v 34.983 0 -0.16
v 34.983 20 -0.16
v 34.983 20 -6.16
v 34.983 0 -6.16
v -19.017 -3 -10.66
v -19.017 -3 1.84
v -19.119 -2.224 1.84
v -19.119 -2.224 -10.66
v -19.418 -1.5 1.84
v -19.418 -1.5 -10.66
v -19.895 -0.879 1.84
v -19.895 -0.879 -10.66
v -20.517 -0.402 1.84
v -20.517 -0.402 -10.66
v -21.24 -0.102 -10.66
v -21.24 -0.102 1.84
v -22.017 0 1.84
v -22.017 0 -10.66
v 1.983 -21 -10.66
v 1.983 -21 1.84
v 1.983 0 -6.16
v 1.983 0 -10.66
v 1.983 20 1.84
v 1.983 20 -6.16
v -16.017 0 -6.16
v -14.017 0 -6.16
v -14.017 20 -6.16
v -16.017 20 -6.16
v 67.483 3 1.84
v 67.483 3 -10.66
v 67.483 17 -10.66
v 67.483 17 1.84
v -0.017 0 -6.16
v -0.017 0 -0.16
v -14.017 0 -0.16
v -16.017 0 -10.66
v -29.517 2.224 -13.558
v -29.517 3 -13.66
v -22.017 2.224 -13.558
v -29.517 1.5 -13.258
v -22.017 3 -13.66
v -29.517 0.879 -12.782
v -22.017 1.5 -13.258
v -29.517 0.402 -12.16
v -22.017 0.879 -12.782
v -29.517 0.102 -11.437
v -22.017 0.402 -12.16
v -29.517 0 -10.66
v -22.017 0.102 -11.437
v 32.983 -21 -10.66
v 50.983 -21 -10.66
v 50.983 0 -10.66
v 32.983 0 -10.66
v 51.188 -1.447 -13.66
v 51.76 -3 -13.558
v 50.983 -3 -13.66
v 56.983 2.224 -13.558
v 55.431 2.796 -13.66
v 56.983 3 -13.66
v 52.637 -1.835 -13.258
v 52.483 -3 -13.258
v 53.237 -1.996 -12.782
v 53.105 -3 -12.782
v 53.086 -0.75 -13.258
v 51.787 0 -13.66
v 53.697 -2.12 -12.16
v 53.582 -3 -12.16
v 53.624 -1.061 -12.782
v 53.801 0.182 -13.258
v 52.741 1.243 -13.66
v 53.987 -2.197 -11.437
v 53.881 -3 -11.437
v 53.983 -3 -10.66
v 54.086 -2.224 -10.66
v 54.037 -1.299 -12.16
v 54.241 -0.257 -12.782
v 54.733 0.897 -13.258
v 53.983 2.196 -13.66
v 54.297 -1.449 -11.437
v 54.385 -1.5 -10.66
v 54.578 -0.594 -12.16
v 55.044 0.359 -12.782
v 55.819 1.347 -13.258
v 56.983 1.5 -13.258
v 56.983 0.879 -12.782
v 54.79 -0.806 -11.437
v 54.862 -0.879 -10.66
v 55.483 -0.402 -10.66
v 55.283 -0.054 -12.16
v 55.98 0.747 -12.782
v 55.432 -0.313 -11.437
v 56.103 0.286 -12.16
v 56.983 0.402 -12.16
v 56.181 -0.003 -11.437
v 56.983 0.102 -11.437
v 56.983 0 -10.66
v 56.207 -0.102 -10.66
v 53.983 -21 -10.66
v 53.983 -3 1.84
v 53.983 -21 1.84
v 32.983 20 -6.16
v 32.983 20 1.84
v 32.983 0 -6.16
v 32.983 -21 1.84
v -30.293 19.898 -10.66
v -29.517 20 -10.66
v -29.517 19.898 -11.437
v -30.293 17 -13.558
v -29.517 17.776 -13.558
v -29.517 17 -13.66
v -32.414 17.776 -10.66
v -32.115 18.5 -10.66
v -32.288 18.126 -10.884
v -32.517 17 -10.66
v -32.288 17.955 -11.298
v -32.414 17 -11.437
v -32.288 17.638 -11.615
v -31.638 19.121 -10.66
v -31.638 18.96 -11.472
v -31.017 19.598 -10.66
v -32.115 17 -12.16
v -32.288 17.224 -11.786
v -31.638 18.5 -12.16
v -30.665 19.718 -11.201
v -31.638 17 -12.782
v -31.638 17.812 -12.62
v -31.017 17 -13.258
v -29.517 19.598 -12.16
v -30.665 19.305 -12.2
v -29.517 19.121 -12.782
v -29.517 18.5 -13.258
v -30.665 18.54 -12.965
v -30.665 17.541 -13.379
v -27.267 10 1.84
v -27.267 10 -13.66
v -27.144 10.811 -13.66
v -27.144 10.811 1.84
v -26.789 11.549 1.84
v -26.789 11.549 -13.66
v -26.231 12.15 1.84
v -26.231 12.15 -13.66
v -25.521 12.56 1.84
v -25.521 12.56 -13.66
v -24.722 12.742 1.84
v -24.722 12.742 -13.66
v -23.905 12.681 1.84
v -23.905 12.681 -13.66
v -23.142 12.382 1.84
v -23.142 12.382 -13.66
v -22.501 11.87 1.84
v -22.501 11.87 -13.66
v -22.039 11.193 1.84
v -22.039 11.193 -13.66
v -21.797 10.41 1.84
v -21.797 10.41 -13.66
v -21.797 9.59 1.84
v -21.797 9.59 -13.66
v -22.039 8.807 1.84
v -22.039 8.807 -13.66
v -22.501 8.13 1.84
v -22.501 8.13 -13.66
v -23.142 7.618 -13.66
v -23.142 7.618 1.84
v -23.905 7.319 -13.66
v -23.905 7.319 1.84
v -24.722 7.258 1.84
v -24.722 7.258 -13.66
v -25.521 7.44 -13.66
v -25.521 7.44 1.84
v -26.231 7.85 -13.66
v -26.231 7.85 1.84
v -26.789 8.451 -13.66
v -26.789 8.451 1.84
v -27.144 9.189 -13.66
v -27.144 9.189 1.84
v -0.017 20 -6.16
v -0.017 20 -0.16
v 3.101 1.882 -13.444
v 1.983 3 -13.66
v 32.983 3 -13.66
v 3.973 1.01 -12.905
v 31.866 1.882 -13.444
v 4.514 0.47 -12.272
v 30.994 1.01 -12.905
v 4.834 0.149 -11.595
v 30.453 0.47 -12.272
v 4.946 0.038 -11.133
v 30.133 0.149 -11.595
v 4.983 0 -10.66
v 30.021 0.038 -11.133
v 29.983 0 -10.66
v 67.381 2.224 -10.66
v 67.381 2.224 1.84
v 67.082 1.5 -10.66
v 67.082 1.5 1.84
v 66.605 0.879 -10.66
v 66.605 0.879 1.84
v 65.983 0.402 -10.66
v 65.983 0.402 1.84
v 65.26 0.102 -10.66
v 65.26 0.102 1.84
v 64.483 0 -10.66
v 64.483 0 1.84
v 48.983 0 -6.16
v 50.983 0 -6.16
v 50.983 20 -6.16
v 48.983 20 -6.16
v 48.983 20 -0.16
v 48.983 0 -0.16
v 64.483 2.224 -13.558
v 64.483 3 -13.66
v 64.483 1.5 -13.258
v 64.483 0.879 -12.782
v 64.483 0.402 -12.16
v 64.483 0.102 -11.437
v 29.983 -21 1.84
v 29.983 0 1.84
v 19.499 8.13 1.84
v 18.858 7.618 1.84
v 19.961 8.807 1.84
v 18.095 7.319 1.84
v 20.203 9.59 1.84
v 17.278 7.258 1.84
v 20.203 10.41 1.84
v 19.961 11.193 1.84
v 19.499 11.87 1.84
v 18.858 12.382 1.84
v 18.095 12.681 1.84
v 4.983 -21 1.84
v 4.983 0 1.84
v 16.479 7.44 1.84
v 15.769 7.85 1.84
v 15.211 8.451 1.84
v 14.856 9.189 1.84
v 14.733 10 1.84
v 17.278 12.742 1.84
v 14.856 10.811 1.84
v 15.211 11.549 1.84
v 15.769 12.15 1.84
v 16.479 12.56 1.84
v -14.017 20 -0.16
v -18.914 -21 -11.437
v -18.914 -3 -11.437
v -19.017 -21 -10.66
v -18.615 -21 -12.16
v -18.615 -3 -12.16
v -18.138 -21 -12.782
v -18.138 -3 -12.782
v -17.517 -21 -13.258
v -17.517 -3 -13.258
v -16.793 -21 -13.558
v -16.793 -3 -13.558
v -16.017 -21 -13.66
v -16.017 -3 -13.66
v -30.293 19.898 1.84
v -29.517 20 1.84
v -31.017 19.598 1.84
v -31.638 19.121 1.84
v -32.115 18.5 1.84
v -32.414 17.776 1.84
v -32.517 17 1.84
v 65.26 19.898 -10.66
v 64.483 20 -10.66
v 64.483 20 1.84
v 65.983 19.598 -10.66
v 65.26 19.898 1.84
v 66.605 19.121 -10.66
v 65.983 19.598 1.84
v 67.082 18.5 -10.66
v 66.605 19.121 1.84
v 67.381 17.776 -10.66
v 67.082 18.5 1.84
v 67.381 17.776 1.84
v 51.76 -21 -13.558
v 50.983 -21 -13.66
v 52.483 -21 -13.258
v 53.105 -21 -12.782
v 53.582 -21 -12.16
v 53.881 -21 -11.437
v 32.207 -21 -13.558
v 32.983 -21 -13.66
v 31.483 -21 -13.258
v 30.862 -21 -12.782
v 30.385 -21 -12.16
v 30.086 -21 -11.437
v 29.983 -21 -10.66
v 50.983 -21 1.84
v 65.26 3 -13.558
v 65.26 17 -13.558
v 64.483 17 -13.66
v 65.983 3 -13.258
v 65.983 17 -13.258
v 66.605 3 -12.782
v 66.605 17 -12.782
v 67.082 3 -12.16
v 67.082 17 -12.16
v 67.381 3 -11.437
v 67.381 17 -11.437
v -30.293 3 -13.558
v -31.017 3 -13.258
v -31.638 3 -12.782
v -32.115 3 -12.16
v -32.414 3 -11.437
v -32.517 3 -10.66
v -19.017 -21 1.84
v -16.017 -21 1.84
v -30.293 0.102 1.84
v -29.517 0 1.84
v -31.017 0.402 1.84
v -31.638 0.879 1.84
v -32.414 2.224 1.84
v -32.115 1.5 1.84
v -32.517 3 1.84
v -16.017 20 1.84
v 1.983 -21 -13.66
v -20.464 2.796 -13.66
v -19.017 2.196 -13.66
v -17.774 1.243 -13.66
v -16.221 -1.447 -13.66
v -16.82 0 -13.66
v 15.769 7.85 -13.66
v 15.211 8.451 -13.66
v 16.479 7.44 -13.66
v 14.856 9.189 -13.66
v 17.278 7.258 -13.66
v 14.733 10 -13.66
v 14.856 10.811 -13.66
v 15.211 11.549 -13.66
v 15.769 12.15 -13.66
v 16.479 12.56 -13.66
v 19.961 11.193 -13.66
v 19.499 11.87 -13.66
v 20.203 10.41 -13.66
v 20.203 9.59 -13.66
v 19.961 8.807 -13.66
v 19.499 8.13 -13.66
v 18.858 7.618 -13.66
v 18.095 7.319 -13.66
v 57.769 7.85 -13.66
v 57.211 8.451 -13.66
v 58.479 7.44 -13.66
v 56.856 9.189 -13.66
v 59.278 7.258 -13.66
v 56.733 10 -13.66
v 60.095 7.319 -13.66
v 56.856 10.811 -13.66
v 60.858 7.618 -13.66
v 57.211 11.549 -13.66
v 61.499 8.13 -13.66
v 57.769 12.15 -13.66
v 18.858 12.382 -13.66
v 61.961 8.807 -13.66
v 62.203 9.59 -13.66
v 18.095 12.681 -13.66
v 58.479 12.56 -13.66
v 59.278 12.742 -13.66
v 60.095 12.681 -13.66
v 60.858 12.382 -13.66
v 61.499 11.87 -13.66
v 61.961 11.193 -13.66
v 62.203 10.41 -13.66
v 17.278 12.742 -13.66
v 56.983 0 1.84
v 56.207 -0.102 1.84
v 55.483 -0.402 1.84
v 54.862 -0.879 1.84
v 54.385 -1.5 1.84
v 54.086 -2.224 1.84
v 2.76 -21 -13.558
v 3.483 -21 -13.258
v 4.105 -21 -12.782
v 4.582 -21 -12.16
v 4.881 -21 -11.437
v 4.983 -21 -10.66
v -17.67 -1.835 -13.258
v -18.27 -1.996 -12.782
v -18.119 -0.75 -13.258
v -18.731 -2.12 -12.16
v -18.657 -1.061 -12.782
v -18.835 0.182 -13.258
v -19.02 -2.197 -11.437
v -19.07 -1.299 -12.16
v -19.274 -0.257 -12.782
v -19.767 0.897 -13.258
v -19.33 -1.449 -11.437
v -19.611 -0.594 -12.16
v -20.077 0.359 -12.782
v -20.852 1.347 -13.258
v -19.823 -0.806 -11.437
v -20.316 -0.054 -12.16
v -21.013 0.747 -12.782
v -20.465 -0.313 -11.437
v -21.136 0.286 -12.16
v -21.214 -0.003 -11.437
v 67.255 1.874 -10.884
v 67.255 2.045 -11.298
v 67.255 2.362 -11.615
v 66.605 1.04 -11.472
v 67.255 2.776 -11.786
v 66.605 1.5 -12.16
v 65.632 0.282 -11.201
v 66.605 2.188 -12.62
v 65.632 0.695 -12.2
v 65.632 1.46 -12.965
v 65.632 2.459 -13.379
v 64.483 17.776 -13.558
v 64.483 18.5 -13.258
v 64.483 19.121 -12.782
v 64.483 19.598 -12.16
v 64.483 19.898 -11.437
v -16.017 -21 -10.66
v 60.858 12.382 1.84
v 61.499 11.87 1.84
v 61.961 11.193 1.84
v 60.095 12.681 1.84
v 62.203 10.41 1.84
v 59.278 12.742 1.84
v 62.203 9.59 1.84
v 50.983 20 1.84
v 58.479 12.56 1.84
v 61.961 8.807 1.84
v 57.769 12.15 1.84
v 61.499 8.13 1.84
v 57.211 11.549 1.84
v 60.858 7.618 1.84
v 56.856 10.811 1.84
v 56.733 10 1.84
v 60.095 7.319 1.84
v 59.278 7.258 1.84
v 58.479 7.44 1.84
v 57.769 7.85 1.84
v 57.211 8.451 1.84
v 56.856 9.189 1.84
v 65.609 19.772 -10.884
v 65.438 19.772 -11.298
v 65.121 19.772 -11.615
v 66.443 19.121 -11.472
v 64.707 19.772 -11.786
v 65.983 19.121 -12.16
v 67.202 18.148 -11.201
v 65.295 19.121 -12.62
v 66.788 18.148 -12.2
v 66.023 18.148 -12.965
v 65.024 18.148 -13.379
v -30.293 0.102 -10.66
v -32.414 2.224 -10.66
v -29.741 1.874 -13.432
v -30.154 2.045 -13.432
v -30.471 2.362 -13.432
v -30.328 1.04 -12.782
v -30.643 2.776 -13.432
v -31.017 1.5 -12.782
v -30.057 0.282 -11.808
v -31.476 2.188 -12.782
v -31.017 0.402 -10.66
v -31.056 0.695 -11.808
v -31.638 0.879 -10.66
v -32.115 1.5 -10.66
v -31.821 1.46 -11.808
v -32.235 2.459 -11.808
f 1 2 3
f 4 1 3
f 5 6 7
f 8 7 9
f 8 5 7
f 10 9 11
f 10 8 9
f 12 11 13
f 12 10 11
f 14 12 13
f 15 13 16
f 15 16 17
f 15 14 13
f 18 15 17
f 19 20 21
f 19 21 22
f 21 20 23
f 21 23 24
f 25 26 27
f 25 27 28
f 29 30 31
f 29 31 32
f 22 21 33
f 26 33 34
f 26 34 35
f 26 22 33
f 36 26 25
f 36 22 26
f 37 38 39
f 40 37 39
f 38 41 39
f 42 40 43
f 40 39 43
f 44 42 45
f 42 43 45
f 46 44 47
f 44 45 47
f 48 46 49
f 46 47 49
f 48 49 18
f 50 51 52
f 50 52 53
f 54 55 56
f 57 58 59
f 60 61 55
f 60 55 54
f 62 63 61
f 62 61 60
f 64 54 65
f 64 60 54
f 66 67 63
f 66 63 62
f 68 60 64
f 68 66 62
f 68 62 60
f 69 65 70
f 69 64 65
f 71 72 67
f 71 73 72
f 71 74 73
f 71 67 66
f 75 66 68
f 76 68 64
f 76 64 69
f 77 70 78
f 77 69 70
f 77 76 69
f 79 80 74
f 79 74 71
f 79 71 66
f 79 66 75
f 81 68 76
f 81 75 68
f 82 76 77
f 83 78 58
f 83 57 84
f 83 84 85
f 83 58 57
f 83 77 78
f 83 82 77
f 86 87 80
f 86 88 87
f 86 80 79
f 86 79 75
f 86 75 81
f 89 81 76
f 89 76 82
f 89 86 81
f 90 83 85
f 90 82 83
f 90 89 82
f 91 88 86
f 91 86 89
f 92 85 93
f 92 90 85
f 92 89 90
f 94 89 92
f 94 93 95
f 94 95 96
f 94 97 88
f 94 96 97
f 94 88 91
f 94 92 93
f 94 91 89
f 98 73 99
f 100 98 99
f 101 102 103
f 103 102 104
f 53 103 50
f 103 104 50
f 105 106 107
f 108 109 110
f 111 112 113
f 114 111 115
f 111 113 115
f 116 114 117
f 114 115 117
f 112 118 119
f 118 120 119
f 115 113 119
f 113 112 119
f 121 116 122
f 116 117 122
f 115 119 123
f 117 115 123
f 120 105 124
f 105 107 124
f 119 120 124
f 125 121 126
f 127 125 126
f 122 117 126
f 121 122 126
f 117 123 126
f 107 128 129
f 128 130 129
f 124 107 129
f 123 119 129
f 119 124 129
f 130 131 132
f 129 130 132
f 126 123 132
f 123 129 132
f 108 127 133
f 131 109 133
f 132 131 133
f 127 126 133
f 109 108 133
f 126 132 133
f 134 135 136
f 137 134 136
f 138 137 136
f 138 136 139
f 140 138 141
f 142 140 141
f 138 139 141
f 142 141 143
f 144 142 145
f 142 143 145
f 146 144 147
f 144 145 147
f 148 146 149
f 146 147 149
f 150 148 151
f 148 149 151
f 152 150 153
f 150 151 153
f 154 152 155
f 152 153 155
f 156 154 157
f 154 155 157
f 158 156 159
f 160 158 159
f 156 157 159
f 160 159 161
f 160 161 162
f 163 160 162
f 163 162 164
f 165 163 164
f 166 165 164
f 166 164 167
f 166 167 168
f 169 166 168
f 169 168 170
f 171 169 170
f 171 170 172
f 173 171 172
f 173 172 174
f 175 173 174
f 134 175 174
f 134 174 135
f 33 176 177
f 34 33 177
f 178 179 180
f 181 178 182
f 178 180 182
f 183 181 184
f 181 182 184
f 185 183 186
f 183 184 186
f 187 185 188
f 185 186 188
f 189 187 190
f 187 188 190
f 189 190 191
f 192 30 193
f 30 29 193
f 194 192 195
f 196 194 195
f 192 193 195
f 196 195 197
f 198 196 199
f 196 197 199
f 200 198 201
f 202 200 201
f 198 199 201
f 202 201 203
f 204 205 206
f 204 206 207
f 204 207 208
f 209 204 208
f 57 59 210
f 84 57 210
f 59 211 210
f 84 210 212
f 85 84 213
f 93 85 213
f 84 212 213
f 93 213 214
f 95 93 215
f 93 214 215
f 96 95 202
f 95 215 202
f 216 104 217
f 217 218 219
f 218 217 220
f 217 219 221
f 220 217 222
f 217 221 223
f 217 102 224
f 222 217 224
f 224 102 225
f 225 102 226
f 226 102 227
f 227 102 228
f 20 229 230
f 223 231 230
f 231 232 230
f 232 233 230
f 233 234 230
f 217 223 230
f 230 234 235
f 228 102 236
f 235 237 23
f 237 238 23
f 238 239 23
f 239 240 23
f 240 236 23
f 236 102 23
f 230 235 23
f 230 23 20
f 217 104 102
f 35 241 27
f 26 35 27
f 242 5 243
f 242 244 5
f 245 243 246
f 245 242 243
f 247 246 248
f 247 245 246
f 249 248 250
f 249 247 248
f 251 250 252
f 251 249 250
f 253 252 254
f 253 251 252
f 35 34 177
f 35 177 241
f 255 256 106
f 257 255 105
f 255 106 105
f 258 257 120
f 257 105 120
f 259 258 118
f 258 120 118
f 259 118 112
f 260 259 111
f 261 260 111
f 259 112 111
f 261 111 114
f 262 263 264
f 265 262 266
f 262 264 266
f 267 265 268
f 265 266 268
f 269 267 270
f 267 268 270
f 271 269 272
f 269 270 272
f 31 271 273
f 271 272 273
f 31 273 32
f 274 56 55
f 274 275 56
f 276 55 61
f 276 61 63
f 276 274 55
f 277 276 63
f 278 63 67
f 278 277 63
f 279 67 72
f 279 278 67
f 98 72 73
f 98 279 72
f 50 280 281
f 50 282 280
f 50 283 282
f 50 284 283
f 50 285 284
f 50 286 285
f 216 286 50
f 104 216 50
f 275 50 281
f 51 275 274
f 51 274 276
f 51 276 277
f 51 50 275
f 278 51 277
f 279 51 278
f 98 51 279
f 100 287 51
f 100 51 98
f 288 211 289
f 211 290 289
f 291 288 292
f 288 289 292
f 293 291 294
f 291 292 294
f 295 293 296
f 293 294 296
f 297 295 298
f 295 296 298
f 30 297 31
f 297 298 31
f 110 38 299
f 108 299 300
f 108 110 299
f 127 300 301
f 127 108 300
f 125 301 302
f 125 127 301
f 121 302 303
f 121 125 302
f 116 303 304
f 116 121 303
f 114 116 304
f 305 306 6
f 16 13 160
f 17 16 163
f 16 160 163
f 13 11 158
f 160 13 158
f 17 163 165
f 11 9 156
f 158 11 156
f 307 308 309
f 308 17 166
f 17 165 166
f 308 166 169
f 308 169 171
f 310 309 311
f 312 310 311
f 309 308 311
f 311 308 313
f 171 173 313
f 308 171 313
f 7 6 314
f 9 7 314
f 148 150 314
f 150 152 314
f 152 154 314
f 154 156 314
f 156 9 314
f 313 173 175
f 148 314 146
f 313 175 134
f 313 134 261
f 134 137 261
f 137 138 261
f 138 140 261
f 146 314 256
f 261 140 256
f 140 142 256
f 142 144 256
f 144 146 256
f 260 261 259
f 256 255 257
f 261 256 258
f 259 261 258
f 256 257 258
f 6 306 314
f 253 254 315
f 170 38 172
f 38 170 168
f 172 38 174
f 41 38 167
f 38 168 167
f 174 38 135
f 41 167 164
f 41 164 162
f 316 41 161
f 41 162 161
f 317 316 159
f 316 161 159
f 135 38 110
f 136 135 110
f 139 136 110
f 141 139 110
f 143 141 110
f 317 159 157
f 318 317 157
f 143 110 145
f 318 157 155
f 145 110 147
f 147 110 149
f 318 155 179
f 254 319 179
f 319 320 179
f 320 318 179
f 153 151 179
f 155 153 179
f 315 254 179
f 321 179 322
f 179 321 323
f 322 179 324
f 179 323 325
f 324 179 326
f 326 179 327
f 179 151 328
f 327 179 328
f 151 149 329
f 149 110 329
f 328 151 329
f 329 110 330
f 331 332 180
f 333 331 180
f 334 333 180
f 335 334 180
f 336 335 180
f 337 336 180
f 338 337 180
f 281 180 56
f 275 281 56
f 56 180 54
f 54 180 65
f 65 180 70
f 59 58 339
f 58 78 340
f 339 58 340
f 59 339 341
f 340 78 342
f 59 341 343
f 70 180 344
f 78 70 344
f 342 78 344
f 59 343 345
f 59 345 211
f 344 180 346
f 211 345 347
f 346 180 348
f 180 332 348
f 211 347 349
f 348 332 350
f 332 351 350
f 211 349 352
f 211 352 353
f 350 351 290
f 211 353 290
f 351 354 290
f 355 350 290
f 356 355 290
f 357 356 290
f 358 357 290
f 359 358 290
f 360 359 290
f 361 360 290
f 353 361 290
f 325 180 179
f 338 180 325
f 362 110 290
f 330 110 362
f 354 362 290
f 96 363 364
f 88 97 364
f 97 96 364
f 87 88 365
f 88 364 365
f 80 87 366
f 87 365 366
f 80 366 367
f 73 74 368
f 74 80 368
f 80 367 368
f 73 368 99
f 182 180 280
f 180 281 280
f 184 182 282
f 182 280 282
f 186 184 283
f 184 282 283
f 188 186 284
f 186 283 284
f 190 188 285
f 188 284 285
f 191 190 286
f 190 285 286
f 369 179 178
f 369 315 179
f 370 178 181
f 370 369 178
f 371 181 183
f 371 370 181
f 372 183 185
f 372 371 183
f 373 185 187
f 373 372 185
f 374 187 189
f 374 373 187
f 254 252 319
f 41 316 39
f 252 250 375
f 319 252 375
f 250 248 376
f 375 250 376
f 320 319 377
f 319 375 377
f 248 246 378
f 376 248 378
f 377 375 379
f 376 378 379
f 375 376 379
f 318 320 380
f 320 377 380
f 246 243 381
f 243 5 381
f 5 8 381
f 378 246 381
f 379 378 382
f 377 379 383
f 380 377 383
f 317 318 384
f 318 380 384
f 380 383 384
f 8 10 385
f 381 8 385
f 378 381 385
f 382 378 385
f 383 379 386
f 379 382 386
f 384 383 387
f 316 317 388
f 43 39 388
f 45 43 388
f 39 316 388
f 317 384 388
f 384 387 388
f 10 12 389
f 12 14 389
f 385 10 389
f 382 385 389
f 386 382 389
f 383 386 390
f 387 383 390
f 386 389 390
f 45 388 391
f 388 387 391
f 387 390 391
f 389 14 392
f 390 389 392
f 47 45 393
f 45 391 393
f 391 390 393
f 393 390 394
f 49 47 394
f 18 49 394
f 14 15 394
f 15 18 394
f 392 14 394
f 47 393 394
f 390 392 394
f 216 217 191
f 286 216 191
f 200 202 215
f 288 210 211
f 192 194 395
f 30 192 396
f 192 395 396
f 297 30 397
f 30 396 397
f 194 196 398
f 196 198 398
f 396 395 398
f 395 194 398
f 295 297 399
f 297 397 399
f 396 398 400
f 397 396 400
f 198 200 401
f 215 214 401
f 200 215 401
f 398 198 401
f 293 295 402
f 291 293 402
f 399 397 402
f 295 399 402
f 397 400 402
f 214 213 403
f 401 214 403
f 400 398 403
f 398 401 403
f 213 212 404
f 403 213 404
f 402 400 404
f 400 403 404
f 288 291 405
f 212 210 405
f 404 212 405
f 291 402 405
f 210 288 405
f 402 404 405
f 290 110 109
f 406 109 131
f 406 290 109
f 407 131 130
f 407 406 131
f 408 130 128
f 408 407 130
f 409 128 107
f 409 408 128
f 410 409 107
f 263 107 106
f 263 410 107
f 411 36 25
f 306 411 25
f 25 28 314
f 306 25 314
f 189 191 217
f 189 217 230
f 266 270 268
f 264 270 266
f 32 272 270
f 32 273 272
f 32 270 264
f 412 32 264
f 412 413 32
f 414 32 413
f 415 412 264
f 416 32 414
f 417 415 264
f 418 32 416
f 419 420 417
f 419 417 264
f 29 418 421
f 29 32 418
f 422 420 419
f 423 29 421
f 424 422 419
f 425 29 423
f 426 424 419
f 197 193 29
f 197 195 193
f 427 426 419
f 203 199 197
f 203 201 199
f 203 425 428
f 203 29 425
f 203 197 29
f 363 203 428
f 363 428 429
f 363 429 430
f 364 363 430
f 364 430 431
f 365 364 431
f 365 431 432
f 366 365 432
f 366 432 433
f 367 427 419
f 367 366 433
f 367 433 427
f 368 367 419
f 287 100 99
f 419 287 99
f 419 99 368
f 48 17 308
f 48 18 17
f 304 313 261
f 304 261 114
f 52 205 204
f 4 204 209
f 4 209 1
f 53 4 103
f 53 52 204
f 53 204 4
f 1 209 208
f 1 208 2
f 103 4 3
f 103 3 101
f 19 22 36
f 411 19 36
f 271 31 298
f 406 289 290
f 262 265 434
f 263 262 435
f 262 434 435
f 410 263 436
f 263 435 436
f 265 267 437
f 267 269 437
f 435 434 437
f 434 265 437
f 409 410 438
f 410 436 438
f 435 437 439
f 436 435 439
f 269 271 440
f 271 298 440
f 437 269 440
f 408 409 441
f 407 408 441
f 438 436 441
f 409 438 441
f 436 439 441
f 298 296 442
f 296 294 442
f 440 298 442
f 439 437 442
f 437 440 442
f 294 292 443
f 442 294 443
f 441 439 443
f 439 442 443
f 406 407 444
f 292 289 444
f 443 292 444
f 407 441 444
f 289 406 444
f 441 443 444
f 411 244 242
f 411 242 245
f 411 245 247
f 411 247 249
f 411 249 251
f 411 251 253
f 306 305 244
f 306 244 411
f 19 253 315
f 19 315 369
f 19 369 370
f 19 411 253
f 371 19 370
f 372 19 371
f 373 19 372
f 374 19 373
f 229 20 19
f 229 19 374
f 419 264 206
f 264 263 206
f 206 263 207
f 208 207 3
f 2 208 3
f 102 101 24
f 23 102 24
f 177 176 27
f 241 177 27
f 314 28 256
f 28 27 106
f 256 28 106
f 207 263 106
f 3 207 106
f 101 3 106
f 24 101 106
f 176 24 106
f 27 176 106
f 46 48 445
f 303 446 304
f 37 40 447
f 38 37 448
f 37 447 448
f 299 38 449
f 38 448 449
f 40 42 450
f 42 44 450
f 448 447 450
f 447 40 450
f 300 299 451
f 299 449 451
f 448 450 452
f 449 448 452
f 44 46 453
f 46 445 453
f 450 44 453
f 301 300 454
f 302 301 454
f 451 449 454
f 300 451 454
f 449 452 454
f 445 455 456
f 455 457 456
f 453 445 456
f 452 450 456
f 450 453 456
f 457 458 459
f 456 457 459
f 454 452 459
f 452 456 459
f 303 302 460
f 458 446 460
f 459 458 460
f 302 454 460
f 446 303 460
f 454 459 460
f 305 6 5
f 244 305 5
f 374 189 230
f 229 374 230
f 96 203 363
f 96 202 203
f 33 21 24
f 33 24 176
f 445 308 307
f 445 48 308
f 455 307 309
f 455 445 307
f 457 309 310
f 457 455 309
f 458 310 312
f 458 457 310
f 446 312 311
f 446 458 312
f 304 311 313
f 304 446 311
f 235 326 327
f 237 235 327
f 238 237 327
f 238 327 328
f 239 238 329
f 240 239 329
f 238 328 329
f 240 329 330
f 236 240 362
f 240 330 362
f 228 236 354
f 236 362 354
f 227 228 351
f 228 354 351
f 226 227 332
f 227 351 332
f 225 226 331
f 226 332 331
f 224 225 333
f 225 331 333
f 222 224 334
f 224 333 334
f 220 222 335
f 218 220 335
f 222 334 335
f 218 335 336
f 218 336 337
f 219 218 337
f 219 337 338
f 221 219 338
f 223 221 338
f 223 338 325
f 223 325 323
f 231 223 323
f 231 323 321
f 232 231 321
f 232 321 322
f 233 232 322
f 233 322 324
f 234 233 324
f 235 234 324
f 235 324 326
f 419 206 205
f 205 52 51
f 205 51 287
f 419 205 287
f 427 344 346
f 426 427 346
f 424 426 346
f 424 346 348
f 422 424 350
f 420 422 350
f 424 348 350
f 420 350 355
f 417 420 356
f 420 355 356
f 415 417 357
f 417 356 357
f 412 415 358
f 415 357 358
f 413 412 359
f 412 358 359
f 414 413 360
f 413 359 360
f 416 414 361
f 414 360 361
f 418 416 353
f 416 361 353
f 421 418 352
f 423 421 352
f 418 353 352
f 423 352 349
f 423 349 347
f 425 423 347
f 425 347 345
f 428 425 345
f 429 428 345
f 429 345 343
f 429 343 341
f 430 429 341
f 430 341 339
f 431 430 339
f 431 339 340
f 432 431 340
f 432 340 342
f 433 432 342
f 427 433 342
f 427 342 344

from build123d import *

# Parameters (mm, degrees)
BOSS_EXTRUDE1_DEPTH = 20
EXTRUDE_THIN3_DEPTH = 21
SKETCH3_R           = 2.75
CUT_EXTRUDE1_DEPTH  = 73.35515227
FILLET2_R           = 3


with BuildPart() as part:
    # Sketch1 → Boss-Extrude1 (new body)
    with BuildSketch(Plane(origin=(0, 0, 0), x_dir=(1, 0, 0), z_dir=(0, 1, 0))):
        Polygon((-32.516534914, -1.83981797), (-32.516534914, 13.66018203), (67.483465086, 13.66018203), (67.483465086, -1.83981797), (50.983465086, -1.83981797), (50.983465086, 1.63642231), (50.983465086, 6.16018203), (48.983465086, 6.16018203), (48.983465086, 0.16018203), (34.983465086, 0.16018203), (34.983465086, 6.16018203), (32.983465086, 6.16018203), (32.983465086, 1.63642231), (32.983465086, -1.83981797), (1.983465086, -1.83981797), (1.983465086, 1.63642231), (1.983465086, 6.16018203), (-0.016534914, 6.16018203), (-0.016534914, 0.16018203), (-14.016534914, 0.16018203), (-14.016534914, 6.16018203), (-16.016534914, 6.16018203), (-16.016534914, 1.63642231), (-16.016534914, -1.83981797), align=None)
    extrude(amount=BOSS_EXTRUDE1_DEPTH)

    # Sketch2 → Extrude-Thin3 (add)
    with BuildSketch(Plane.XZ):
        Polygon((-19.016534914, 1.83981797), (-19.016534914, -13.66018203), (4.983465086, -13.66018203), (4.983465086, 1.83981797), (1.983465086, 1.83981797), (1.983465086, -10.66018203), (-16.016534914, -10.66018203), (-16.016534914, 1.83981797), align=None)
        Polygon((50.983465086, 1.83981797), (50.983465086, -10.66018203), (32.983465086, -10.66018203), (32.983465086, 1.83981797), (29.983465086, 1.83981797), (29.983465086, -13.66018203), (53.983465086, -13.66018203), (53.983465086, 1.83981797), align=None)
    extrude(amount=EXTRUDE_THIN3_DEPTH)

    # Sketch3 → Cut-Extrude1 (cut, through all)
    with BuildSketch(Plane(origin=(0, 0, -13.66018203), x_dir=(-1, 0, 0), z_dir=(0, 0, -1))):
        with Locations((24.516534914, 10)):
            Circle(SKETCH3_R)
        with Locations((-59.483465086, 10)):
            Circle(SKETCH3_R)
        with Locations((-17.483465086, 10)):
            Circle(SKETCH3_R)
    extrude(amount=-CUT_EXTRUDE1_DEPTH, mode=Mode.SUBTRACT)

    # Fillet2
    fillet2_edges = [part.edges().sort_by_distance(p)[0] for p in [
        (17.483465086, 0, -13.66018203),
        (29.983465086, -10.5, -13.66018203),
        (53.983465086, -10.5, -13.66018203),
        (60.733465086, 0, -13.66018203),
        (67.483465086, 0, -5.91018203),
        (67.483465086, 10, -13.66018203),
        (67.483465086, 20, -5.91018203),
        (17.483465086, 20, -13.66018203),
        (-32.516534914, 20, -5.91018203),
        (-32.516534914, 0, -5.91018203),
        (-19.016534914, 0, -5.91018203),
        (4.983465086, -10.5, -13.66018203),
        (-19.016534914, -10.5, -13.66018203),
        (-25.766534914, 0, -13.66018203),
        (-32.516534914, 10, -13.66018203),
        (53.983465086, 0, -5.91018203),
    ]]
    fillet(fillet2_edges, radius=FILLET2_R)


solid = part.part
